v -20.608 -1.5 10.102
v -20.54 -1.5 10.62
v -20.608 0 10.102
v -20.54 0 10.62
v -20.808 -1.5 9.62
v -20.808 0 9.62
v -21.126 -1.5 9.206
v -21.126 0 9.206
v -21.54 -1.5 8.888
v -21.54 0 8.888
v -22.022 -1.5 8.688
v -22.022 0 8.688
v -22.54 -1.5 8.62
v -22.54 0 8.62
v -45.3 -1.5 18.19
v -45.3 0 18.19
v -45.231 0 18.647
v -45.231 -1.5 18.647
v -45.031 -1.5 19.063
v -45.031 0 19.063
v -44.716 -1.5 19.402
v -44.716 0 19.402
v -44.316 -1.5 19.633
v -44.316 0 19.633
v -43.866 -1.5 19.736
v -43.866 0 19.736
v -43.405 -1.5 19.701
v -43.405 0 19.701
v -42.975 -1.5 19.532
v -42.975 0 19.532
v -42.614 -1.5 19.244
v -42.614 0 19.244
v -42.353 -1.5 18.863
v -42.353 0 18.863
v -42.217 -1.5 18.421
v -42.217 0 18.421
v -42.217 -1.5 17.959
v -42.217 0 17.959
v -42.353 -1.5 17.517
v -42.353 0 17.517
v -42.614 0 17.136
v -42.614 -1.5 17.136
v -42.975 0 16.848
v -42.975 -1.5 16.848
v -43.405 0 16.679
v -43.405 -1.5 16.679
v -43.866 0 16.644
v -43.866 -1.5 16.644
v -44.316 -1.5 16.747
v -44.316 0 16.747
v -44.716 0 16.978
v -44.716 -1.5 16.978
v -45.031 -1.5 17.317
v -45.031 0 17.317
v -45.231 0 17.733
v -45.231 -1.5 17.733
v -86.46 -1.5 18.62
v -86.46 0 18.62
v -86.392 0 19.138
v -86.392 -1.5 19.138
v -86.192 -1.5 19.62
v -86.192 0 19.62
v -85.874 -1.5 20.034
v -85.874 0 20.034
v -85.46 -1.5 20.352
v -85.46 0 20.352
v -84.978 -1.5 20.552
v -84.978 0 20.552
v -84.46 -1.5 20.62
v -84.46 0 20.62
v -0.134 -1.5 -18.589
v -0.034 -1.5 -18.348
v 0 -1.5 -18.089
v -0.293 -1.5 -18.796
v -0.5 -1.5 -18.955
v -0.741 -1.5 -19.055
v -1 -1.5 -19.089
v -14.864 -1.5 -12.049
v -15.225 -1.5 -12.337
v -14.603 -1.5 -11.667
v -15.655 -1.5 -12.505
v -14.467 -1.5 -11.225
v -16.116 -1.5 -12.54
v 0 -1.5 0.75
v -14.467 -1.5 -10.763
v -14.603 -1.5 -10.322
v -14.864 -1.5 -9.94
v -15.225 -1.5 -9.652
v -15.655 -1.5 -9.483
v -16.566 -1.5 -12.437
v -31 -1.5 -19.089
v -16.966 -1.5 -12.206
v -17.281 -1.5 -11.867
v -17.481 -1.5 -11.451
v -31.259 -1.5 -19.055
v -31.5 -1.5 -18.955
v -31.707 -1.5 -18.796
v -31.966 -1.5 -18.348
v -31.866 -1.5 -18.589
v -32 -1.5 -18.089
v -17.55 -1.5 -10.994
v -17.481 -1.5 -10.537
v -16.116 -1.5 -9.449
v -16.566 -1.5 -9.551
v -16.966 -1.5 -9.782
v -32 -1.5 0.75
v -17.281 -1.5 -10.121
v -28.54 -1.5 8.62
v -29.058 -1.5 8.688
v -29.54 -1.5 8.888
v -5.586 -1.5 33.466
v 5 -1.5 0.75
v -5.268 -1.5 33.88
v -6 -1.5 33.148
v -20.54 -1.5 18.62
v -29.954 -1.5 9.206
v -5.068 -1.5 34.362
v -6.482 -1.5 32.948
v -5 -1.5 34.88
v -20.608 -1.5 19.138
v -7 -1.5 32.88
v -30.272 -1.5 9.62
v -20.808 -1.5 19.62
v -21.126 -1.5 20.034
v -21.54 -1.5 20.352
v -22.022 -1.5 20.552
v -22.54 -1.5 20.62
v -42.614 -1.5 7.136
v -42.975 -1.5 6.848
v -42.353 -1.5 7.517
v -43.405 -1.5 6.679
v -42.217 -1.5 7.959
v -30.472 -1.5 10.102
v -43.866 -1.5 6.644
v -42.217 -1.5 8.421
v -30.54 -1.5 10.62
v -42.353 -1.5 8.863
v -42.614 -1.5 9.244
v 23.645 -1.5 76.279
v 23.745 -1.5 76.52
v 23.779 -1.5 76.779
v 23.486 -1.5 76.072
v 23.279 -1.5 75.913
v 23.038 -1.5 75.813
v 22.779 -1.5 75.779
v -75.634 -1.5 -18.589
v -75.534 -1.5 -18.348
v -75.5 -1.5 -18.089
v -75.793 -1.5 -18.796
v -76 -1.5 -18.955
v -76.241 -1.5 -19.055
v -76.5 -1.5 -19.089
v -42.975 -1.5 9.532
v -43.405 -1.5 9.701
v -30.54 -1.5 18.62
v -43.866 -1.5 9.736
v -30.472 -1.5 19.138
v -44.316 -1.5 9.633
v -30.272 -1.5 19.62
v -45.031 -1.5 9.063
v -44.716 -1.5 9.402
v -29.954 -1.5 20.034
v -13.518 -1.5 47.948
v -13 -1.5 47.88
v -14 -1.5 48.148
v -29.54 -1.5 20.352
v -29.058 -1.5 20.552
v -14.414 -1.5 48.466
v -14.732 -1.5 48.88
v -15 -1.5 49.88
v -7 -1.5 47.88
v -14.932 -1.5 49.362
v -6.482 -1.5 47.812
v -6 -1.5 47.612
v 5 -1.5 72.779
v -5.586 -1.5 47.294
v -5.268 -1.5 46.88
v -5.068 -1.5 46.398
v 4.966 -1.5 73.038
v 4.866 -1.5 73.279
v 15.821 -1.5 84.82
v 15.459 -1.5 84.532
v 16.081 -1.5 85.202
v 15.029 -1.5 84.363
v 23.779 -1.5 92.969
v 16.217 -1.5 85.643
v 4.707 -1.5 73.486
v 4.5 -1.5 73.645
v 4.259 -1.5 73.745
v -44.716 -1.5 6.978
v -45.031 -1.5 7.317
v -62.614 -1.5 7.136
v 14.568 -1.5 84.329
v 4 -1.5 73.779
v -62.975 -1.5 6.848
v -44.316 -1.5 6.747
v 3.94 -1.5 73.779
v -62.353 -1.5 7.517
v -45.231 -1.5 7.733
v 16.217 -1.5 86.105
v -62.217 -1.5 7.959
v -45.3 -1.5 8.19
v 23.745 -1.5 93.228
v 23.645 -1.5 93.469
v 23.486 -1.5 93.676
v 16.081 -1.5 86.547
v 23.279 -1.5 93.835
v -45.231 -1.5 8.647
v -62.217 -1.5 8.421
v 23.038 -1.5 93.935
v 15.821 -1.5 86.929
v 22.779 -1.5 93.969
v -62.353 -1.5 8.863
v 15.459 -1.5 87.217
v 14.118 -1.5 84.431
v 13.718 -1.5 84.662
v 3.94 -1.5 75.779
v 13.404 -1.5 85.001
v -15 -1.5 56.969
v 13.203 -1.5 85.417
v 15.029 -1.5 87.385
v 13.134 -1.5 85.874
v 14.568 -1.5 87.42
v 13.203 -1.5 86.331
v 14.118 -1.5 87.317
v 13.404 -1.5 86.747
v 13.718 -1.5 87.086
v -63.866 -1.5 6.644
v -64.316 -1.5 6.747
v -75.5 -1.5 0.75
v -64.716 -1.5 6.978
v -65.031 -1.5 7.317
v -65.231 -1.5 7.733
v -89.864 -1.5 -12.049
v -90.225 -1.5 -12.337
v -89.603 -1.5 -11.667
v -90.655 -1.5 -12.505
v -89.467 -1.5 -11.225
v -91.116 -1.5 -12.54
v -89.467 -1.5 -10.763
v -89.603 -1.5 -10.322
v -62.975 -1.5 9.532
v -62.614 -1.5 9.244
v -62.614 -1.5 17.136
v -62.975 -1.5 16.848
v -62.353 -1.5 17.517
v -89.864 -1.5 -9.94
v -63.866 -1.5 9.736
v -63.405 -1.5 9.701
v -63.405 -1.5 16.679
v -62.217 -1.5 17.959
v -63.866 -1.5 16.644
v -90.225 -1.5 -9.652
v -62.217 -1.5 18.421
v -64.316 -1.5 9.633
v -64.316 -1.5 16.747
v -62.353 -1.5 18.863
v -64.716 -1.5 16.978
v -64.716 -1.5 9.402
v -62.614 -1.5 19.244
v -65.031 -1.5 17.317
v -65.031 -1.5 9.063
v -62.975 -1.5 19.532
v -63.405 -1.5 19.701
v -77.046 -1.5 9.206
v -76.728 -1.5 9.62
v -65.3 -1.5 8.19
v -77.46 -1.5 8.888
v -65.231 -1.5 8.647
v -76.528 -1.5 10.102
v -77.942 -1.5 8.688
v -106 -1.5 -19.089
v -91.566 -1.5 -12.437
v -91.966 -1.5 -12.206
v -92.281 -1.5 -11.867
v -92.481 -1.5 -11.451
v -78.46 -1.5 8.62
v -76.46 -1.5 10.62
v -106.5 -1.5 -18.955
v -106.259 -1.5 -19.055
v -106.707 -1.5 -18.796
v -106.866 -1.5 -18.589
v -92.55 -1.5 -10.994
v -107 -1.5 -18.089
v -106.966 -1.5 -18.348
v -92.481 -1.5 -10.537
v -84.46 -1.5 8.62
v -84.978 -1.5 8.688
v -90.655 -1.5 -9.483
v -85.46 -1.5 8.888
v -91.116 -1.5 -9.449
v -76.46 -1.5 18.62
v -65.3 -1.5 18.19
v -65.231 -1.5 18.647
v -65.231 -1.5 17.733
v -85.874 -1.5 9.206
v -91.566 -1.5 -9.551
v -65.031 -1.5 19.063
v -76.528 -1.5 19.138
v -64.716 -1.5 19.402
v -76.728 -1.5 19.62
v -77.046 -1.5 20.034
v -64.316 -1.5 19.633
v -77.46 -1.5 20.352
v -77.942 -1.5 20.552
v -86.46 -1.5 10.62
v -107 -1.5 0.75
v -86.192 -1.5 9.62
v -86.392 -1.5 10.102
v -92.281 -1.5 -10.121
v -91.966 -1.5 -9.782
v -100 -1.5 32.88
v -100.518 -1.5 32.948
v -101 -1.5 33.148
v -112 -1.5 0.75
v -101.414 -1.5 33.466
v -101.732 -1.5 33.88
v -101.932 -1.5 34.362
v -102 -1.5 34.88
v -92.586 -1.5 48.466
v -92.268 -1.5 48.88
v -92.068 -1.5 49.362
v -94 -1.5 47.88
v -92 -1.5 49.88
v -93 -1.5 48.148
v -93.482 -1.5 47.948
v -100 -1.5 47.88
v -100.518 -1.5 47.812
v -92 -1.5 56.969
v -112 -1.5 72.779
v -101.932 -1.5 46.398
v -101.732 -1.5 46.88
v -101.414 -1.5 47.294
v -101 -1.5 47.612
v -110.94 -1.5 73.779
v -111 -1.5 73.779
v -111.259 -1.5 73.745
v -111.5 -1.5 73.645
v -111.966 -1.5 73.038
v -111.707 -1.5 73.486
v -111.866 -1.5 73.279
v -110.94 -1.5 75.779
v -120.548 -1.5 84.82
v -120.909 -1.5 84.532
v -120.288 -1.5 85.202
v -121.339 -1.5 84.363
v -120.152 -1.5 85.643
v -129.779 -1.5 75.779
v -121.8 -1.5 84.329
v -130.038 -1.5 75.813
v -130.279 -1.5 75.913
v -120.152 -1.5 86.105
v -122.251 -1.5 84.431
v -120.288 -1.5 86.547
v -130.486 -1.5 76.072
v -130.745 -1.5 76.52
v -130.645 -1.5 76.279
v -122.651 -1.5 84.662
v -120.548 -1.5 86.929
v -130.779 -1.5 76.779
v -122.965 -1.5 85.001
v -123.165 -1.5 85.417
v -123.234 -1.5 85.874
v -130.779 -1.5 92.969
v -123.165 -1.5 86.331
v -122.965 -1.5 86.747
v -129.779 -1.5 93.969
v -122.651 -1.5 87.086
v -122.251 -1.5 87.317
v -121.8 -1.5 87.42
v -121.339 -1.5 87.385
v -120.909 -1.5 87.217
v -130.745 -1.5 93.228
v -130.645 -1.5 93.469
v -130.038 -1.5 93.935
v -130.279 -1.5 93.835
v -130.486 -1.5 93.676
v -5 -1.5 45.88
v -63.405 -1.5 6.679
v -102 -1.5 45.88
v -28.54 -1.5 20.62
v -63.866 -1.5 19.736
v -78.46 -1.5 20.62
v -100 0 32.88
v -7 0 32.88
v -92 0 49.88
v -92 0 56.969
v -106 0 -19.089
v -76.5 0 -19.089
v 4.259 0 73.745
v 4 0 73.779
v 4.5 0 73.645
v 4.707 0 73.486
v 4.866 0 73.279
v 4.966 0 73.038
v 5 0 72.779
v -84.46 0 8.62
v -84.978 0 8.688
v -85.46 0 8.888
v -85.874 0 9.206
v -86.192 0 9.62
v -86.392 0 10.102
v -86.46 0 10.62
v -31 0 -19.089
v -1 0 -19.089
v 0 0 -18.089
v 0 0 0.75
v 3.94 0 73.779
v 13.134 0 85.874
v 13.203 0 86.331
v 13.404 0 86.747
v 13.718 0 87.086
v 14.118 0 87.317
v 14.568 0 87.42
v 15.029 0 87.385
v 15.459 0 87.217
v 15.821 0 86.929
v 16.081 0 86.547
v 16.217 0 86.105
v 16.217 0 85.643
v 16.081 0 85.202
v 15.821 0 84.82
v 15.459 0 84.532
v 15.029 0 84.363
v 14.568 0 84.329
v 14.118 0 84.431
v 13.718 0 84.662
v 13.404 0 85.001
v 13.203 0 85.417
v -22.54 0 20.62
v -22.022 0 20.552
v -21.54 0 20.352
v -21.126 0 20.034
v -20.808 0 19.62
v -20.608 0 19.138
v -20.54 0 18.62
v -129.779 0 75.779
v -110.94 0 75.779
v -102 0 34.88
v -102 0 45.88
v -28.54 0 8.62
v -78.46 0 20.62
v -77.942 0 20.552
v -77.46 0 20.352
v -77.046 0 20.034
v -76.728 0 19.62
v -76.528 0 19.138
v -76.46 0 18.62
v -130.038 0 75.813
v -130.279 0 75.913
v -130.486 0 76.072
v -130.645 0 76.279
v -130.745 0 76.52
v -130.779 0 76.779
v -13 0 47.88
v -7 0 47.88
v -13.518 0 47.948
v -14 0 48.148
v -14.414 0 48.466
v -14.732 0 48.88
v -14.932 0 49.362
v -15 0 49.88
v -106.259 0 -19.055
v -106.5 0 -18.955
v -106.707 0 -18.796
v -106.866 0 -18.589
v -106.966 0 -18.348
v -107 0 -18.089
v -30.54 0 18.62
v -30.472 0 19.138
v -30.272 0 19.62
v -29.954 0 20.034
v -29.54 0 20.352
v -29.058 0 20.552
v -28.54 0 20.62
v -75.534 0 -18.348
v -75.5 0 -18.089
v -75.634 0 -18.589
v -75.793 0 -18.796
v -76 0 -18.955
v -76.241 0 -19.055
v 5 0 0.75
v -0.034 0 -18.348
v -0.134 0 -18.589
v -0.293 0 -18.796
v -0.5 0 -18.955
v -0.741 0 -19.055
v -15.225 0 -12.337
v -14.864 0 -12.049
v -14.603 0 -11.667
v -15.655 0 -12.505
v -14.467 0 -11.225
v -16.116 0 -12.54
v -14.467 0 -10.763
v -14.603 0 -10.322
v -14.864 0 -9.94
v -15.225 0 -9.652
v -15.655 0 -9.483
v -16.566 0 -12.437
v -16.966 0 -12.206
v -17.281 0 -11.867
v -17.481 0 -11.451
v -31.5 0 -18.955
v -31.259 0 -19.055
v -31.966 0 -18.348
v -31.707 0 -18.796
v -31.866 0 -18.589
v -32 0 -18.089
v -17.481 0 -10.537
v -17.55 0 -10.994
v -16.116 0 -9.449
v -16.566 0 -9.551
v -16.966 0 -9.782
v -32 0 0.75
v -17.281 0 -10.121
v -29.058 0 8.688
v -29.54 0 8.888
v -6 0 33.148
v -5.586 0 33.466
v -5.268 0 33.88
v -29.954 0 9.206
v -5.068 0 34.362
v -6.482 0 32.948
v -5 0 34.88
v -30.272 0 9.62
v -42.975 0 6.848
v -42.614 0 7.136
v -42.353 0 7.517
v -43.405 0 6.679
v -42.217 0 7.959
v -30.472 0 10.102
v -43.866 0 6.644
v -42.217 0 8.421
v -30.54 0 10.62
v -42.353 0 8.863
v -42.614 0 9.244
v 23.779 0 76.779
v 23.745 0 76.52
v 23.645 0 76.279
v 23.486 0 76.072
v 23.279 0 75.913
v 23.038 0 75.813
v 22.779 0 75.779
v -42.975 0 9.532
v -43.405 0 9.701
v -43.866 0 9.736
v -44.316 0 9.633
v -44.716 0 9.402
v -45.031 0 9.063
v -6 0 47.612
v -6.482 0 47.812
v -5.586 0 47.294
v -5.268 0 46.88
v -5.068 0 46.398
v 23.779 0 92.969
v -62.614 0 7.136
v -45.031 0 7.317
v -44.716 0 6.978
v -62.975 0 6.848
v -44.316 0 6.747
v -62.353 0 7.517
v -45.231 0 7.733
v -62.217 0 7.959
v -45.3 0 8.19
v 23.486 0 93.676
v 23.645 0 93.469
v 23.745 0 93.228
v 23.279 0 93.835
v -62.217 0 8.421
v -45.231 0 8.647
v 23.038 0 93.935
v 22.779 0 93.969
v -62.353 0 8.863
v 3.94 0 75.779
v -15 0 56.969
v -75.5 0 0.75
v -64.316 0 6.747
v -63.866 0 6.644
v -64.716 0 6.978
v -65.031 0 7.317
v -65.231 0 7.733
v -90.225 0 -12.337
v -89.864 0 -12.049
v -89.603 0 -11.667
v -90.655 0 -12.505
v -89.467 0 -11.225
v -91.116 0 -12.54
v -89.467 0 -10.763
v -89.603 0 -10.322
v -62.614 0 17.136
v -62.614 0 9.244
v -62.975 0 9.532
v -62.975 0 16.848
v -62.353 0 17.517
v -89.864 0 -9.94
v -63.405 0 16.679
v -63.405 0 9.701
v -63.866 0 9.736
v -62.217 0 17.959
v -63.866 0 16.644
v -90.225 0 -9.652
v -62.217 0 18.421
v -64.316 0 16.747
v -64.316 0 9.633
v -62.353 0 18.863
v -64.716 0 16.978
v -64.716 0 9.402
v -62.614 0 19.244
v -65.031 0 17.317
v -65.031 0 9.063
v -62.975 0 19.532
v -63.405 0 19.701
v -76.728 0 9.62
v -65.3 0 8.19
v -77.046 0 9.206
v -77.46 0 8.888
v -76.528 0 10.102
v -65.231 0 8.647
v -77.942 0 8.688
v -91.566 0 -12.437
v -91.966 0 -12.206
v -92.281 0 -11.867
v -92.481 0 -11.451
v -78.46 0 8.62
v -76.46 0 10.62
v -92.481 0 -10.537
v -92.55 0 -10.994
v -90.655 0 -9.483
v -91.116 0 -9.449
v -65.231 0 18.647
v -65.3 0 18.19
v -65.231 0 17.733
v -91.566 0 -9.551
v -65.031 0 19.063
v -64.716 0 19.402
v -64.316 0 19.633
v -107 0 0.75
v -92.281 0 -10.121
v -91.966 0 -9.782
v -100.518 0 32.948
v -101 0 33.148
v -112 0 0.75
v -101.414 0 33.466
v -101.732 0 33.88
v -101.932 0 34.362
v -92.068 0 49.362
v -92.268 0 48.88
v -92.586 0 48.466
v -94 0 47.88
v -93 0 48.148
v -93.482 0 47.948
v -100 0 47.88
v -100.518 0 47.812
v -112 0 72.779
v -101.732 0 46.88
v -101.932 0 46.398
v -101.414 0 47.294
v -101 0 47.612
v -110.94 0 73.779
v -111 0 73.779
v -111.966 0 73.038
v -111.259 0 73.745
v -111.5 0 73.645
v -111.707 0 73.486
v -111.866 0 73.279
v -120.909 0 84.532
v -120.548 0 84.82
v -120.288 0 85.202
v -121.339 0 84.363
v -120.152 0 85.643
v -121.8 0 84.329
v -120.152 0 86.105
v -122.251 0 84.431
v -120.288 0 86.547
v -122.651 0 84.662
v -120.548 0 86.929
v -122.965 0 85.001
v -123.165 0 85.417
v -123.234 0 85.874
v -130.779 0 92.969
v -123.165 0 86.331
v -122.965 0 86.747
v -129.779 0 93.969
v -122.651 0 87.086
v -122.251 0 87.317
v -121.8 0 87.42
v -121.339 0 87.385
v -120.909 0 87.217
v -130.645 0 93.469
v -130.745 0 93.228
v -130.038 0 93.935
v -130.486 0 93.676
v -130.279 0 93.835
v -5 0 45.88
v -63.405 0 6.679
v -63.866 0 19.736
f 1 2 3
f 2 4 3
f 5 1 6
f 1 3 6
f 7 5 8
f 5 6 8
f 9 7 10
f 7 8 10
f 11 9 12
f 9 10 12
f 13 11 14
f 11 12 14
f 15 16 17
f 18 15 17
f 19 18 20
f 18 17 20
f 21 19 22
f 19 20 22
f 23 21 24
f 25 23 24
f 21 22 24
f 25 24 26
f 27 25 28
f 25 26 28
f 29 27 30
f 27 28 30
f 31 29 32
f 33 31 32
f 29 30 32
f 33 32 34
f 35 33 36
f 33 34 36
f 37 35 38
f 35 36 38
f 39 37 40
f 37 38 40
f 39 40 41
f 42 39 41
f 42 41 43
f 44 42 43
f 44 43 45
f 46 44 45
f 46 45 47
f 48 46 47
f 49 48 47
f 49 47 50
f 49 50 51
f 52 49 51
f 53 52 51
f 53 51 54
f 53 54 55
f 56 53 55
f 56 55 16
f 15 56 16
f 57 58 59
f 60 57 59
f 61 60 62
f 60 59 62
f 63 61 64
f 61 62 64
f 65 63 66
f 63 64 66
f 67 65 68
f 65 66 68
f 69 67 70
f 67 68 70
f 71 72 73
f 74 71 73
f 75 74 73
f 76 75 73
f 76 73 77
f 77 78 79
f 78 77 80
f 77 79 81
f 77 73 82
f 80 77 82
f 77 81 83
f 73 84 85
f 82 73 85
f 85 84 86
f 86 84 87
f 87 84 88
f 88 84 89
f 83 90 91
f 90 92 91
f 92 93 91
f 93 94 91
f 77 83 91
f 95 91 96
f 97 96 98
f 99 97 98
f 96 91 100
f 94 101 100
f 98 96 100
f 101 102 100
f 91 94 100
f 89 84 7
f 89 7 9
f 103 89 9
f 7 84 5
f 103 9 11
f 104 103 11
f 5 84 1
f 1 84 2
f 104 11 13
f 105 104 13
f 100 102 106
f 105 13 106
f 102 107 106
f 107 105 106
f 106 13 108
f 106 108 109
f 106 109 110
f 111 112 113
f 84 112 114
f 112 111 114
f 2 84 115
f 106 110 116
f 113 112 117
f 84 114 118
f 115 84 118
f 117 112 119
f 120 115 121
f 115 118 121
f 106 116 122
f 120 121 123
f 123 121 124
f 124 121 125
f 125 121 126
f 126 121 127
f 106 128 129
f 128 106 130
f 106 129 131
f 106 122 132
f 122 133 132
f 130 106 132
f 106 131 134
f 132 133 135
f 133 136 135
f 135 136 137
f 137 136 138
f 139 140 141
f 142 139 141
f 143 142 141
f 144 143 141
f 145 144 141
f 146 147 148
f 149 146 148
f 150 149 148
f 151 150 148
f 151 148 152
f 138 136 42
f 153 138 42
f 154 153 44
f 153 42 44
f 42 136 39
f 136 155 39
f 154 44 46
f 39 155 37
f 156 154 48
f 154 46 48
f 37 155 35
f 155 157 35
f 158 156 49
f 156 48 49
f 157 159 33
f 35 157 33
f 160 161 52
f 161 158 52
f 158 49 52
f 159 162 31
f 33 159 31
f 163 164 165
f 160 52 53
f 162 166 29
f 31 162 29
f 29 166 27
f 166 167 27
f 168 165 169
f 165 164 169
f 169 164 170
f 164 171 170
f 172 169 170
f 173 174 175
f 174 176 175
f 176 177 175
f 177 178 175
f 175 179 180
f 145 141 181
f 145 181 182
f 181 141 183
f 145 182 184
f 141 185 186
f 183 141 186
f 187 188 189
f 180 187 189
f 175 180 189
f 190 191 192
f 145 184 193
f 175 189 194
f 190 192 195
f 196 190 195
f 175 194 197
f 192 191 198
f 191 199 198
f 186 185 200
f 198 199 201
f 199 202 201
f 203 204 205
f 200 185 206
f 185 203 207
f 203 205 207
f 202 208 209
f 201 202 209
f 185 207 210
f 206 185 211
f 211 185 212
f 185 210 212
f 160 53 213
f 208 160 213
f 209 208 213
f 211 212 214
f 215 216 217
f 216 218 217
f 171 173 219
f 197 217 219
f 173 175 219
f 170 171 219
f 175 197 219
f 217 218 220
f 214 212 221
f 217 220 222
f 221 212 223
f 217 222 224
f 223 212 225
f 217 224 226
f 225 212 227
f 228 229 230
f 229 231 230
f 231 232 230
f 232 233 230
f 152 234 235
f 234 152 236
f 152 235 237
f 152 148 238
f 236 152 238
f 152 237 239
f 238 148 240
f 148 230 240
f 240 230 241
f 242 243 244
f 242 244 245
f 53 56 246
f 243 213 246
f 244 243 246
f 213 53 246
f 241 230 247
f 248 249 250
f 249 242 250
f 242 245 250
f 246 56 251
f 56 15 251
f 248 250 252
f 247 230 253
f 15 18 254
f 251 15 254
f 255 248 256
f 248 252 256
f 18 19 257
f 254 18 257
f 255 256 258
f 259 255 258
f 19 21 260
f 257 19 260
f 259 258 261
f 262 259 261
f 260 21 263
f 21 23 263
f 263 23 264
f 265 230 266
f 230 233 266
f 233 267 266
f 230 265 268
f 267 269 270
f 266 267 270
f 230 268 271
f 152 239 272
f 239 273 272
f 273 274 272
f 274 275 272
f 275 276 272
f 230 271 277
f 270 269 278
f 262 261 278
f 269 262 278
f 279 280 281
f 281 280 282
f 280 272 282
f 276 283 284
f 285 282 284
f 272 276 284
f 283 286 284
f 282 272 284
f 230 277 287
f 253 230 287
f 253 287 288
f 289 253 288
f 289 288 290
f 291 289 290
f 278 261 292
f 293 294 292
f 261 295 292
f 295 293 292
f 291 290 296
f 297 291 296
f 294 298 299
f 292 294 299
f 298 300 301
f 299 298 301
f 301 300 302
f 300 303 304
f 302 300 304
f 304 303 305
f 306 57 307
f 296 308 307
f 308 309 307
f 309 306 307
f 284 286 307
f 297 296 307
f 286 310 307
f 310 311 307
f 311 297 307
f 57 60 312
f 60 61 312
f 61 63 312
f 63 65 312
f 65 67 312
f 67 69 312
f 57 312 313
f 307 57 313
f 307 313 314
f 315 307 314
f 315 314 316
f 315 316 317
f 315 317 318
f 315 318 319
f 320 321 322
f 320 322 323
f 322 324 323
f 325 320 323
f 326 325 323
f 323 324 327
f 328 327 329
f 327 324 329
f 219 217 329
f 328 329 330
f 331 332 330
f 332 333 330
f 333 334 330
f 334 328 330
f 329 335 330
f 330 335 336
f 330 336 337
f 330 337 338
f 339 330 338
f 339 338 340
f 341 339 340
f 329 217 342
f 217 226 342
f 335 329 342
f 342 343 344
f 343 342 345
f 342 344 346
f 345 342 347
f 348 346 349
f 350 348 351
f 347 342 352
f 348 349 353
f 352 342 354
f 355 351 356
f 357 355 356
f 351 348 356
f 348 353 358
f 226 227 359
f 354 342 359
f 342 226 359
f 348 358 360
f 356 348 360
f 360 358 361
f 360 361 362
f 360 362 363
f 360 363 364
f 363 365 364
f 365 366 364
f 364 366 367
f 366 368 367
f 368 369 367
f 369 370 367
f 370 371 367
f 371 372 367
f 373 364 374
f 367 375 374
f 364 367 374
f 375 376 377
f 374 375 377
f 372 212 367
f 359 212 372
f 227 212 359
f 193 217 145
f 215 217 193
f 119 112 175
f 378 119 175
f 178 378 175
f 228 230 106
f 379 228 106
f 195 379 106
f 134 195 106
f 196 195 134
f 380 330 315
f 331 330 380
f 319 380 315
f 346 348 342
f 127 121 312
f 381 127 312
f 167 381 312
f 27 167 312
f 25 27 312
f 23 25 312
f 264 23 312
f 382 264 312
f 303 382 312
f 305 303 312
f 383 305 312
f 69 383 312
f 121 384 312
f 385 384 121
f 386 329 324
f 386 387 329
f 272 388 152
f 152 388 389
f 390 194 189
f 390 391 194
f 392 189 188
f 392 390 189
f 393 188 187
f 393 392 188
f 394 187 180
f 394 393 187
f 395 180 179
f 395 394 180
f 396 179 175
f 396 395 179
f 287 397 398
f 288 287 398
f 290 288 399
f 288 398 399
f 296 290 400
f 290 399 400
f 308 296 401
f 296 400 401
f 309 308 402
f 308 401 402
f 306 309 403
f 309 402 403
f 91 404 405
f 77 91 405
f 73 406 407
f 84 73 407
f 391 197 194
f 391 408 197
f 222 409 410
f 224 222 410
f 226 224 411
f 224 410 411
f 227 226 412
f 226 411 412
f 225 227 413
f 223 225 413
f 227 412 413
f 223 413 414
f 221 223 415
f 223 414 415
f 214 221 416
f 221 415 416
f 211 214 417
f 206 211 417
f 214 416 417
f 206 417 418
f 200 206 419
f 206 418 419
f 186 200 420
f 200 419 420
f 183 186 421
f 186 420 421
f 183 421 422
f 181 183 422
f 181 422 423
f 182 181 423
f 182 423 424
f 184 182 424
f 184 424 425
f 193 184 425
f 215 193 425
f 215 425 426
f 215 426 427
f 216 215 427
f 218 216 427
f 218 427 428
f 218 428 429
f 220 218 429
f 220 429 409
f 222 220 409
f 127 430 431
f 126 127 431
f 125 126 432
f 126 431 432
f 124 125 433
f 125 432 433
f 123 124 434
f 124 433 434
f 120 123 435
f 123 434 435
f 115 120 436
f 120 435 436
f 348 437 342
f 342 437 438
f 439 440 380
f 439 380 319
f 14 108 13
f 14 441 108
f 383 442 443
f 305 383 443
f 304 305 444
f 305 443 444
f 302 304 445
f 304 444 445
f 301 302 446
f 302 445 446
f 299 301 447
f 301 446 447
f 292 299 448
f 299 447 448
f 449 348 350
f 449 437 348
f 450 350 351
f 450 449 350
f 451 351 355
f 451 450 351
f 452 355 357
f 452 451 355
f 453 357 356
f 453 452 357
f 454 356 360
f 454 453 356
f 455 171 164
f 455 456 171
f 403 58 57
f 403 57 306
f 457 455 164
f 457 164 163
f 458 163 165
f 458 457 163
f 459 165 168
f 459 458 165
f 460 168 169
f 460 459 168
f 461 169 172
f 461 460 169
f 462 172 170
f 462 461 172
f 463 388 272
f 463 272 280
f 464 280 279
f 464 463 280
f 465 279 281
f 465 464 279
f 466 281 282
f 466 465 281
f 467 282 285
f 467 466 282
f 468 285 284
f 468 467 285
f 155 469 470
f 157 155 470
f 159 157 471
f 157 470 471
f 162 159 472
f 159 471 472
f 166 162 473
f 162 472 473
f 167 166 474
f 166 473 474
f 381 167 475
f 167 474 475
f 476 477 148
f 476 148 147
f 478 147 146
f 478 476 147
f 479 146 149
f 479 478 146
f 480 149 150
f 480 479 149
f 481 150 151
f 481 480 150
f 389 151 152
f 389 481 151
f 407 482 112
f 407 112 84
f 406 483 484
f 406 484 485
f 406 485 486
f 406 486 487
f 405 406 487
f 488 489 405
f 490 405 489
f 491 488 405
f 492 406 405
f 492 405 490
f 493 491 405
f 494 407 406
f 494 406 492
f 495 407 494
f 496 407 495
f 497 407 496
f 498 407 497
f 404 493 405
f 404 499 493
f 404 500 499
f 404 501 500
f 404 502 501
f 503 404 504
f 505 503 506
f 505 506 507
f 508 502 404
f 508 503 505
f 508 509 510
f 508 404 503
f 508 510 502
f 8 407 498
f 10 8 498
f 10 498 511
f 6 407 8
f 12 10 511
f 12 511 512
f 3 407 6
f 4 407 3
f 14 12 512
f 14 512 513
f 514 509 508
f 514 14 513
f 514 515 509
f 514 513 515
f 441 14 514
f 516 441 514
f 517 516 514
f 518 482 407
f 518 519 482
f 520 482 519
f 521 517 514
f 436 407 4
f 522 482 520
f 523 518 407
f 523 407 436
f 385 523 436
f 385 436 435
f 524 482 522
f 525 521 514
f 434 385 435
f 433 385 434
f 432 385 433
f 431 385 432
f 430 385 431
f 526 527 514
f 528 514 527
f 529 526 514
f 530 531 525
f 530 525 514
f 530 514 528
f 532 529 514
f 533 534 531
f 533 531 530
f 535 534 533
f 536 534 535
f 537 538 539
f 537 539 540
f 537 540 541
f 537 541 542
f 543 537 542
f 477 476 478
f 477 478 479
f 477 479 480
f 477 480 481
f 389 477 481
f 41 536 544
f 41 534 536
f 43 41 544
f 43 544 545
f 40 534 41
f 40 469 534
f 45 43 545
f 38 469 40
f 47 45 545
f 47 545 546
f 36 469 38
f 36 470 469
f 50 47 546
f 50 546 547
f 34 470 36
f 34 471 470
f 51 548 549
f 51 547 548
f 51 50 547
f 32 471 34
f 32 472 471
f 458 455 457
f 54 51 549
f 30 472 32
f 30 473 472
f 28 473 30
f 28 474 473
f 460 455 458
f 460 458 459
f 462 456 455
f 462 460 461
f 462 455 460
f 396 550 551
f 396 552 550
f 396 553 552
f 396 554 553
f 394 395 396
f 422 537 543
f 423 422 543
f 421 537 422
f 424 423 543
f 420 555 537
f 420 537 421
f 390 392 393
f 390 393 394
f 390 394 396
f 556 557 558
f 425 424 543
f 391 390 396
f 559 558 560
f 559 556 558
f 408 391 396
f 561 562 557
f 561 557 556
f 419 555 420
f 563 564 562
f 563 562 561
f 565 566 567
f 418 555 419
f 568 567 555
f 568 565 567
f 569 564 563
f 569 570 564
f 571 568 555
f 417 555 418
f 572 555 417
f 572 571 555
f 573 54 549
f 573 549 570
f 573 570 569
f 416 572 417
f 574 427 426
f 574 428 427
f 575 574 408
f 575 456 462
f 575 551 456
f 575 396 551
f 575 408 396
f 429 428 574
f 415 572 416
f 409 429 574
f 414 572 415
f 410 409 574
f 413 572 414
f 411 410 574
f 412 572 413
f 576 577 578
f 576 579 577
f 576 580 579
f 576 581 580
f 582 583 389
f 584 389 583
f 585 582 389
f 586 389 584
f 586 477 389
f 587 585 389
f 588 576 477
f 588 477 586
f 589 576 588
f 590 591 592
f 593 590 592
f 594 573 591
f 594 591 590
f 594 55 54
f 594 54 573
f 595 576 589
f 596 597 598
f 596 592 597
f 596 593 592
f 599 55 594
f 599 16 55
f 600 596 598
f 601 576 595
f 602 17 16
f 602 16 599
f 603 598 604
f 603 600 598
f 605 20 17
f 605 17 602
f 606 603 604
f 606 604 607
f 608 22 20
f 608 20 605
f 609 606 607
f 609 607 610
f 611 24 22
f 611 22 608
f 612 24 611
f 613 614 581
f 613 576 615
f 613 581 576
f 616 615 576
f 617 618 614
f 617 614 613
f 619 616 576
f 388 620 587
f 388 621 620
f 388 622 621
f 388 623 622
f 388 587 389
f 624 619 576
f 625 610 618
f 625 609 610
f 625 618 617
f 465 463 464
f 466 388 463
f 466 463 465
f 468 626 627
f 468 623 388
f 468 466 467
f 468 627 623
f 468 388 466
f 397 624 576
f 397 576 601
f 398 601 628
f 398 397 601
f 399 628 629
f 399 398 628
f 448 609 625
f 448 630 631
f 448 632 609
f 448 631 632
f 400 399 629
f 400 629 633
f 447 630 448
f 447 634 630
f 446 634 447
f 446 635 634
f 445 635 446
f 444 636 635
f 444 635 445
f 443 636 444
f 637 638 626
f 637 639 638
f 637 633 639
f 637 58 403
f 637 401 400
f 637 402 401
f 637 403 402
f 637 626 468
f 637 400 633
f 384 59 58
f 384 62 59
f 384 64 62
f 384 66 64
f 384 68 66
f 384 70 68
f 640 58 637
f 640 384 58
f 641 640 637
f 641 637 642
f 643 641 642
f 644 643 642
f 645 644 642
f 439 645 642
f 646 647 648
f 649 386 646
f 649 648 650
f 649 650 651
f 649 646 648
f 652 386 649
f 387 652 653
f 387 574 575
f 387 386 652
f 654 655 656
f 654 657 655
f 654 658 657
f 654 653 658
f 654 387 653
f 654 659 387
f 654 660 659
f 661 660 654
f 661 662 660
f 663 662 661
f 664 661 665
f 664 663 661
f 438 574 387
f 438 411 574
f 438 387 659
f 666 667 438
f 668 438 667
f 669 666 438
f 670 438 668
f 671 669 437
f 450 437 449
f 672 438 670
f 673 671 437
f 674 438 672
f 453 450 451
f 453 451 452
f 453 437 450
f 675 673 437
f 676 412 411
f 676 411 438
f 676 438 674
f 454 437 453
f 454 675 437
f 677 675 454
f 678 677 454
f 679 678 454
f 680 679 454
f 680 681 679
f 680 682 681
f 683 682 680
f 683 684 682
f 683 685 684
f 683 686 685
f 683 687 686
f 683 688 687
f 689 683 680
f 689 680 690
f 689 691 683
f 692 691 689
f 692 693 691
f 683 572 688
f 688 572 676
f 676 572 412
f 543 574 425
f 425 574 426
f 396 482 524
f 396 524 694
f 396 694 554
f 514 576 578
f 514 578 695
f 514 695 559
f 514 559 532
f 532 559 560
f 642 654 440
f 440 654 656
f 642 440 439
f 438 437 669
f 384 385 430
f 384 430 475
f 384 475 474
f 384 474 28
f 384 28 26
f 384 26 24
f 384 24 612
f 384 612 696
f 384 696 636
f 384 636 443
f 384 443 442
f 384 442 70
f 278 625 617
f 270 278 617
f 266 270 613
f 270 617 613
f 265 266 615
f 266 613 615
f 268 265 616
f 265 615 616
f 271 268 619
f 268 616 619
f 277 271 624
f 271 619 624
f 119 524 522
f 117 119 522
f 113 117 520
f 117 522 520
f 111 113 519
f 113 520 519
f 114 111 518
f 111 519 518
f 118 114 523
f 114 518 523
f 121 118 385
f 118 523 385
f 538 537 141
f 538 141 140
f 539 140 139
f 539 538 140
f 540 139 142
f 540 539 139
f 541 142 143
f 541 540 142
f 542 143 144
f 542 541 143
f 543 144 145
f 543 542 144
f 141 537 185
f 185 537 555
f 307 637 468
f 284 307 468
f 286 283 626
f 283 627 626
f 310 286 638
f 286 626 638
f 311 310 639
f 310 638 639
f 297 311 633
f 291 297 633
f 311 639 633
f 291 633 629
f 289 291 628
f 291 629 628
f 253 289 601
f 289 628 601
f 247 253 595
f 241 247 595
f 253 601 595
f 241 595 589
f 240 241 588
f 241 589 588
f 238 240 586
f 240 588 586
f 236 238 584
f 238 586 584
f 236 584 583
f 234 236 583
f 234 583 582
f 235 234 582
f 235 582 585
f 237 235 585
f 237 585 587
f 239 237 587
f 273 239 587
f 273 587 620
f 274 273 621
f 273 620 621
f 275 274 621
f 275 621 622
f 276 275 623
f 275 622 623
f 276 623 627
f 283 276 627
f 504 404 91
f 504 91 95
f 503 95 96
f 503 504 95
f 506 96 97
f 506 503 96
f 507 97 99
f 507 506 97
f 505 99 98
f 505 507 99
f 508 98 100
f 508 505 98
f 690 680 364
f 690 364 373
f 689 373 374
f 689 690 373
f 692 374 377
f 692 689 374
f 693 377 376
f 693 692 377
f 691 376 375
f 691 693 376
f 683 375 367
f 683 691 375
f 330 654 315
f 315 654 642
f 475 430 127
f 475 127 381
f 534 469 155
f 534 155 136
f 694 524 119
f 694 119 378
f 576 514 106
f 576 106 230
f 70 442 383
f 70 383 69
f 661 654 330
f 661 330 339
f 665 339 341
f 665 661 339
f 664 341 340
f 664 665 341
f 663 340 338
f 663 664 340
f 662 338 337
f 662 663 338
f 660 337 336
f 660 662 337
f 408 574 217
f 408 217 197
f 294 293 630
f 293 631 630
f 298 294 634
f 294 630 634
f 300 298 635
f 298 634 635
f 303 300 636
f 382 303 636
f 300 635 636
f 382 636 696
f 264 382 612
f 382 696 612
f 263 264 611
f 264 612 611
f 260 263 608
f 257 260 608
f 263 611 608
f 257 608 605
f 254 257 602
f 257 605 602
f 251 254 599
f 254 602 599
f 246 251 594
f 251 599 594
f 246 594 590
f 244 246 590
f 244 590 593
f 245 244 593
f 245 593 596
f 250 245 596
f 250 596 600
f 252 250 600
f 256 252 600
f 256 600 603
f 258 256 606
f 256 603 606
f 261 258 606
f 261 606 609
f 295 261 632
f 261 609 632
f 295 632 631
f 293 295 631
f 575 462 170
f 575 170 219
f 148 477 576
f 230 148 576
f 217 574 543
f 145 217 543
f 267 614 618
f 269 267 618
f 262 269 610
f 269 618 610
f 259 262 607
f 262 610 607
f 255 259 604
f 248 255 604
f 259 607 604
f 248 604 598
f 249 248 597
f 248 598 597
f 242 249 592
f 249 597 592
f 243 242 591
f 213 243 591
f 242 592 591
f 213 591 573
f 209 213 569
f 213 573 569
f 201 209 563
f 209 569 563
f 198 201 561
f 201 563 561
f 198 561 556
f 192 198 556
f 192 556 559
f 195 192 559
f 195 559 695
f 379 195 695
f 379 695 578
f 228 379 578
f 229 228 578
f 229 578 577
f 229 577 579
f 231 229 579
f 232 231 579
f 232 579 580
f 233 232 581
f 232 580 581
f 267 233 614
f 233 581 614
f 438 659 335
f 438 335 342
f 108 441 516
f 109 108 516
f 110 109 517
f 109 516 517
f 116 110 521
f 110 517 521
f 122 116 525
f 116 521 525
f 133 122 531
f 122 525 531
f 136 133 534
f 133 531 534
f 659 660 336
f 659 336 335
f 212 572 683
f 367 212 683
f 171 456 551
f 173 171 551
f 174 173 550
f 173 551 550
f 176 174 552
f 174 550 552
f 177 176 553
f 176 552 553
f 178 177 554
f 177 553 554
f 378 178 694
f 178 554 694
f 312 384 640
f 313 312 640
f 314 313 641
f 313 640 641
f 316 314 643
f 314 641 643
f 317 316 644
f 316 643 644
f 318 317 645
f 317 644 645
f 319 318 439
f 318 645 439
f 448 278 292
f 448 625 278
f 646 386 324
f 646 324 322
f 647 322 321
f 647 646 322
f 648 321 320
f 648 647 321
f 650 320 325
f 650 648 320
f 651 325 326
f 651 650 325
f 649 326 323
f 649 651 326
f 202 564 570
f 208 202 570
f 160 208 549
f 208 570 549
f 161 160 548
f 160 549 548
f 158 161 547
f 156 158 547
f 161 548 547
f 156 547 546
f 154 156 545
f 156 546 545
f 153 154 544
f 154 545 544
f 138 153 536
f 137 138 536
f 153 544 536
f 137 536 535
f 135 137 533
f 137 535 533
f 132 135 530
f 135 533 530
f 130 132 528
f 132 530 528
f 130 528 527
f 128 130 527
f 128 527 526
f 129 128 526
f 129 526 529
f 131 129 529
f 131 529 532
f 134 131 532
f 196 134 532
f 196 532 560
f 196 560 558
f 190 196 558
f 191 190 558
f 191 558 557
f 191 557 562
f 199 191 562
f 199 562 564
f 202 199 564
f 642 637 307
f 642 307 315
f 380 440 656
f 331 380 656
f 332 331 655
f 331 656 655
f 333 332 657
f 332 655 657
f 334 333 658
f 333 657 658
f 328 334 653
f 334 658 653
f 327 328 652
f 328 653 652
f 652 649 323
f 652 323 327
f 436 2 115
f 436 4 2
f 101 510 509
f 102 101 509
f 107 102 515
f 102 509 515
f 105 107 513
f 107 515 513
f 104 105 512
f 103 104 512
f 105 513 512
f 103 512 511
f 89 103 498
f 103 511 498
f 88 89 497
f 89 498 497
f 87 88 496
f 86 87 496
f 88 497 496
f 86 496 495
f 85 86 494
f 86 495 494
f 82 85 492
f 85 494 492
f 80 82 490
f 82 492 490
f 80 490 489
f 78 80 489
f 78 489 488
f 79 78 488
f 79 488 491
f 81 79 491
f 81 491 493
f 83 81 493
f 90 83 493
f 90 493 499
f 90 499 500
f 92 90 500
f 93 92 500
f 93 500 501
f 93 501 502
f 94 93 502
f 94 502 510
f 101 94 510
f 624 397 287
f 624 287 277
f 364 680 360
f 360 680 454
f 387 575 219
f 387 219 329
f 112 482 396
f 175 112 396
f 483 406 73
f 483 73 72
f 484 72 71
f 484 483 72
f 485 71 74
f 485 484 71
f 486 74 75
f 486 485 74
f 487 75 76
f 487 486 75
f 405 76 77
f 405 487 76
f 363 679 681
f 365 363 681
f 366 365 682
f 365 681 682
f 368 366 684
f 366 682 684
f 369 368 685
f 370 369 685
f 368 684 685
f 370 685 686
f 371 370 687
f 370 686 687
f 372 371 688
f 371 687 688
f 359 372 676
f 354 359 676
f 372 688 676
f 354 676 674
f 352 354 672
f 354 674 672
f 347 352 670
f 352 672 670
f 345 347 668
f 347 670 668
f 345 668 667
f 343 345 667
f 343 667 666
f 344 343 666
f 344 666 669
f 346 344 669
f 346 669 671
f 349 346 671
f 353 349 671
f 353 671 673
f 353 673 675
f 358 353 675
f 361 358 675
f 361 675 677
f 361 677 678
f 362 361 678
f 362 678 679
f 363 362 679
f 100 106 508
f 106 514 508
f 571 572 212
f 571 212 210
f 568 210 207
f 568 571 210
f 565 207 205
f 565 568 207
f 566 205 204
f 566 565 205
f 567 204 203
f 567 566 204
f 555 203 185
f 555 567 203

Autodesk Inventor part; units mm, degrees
ref_plane "YZ Plane" through (0, 0, 0) normal (1, 0, 0) x (0, 1, 0)
ref_plane "XZ Plane" through (0, 0, 0) normal (0, 1, 0) x (-1, 0, 0)
ref_plane "XY Plane" through (0, 0, 0) normal (0, 0, 1) x (1, 0, 0)
sketch "Sketch1" plane through (0, 0, 0) normal (0, 1, 0) x (-1, 0, 0)
  line L0 (-5, 55.3296) -> (112, 55.3296)
  line L1 (75.5, -0.4496) -> (107, -0.4496)
  line L2 (-5.1396, 93.9693) -> (-5.1396, 75.7793)
  line L3 (112.1396, 75.7793) -> (112.1396, 93.9693)
  line L4 (0, -0.4496) -> (32, -0.4496)
  arc A0 (30.54, 18.62) -> (28.54, 20.62) centre (28.54, 18.62) ccw
  line L5 (22.54, 20.62) -> (28.54, 20.62)
  arc A1 (28.54, 8.62) -> (30.54, 10.62) centre (28.54, 10.62) ccw
  line L6 (30.54, 18.62) -> (30.54, 10.62)
  arc A2 (22.54, 20.62) -> (20.54, 18.62) centre (22.54, 18.62) ccw
  line L7 (20.54, 10.62) -> (20.54, 18.62)
  arc A3 (20.54, 10.62) -> (22.54, 8.62) centre (22.54, 10.62) ccw
  line L8 (28.54, 8.62) -> (22.54, 8.62)
  arc A4 (78.46, 20.62) -> (76.46, 18.62) centre (78.46, 18.62) ccw
  line L9 (76.46, 10.62) -> (76.46, 18.62)
  arc A5 (86.46, 18.62) -> (84.46, 20.62) centre (84.46, 18.62) ccw
  line L10 (78.46, 20.62) -> (84.46, 20.62)
  arc A6 (76.46, 10.62) -> (78.46, 8.62) centre (78.46, 10.62) ccw
  line L11 (84.46, 8.62) -> (78.46, 8.62)
  arc A7 (84.46, 8.62) -> (86.46, 10.62) centre (84.46, 10.62) ccw
  line L12 (86.46, 18.62) -> (86.46, 10.62)
  arc A8 (7, 47.88) -> (5, 45.88) centre (7, 45.88) ccw
  line L13 (5, 34.88) -> (5, 45.88)
  arc A9 (13, 47.88) -> (15, 49.88) centre (13, 49.88) ccw
  line L14 (15, 49.88) -> (15, 56.9693)
  arc A10 (5, 34.88) -> (7, 32.88) centre (7, 34.88) ccw
  line L15 (100, 32.88) -> (7, 32.88)
  arc A11 (92, 49.88) -> (94, 47.88) centre (94, 49.88) ccw
  line L16 (92, 56.9693) -> (92, 49.88)
  arc A12 (102, 45.88) -> (100, 47.88) centre (100, 45.88) ccw
  line L17 (94, 47.88) -> (100, 47.88)
  arc A13 (100, 32.88) -> (102, 34.88) centre (100, 34.88) ccw
  line L18 (102, 45.88) -> (102, 34.88)
  line L19 (15, 56.9693) -> (92, 56.9693)
  line L20 (7, 47.88) -> (13, 47.88)
  circle A14 centre (91, -10.9943) radius 1.55
  circle A15 centre (16, -10.9943) radius 1.55
  circle A16 centre (121.6843, 85.8743) radius 1.55
  circle A17 centre (-14.6843, 85.8743) radius 1.55
  circle A18 centre (63.75, 8.19) radius 1.55
  circle A19 centre (63.75, 18.19) radius 1.55
  circle A20 centre (43.75, 8.19) radius 1.55
  circle A21 centre (43.75, 18.19) radius 1.55
  arc A22 (112, 72.7793) -> (111, 73.7793) centre (111, 72.7793) ccw
  arc A23 (-4, 73.7793) -> (-5, 72.7793) centre (-4, 72.7793) ccw
  line L21 (-3.94, 73.7793) -> (-4, 73.7793)
  arc A24 (-23.7793, 76.7793) -> (-22.7793, 75.7793) centre (-22.7793, 76.7793) ccw
  arc A25 (-22.7793, 93.9693) -> (-23.7793, 92.9693) centre (-22.7793, 92.9693) ccw
  line L22 (-22.7793, 93.9693) -> (129.7793, 93.9693)
  arc A26 (130.7793, 92.9693) -> (129.7793, 93.9693) centre (129.7793, 92.9693) ccw
  arc A27 (129.7793, 75.7793) -> (130.7793, 76.7793) centre (129.7793, 76.7793) ccw
  line L23 (129.7793, 75.7793) -> (110.94, 75.7793)
  arc A28 (31, -19.0893) -> (32, -18.0893) centre (31, -18.0893) ccw
  arc A29 (0, -18.0893) -> (1, -19.0893) centre (1, -18.0893) ccw
  arc A30 (106, -19.0893) -> (107, -18.0893) centre (106, -18.0893) ccw
  arc A31 (75.5, -18.0893) -> (76.5, -19.0893) centre (76.5, -18.0893) ccw
  line L24 (75.5, -18.0893) -> (75.5, 0.75)
  line L25 (106, -19.0893) -> (76.5, -19.0893)
  line L26 (107, 0.75) -> (107, -18.0893)
  line L27 (107, 0.75) -> (112, 0.75)
  line L28 (112, 72.7793) -> (112, 0.75)
  line L29 (31, -19.0893) -> (1, -19.0893)
  line L30 (0, -18.0893) -> (0, 0.75)
  line L31 (-5, 0.75) -> (0, 0.75)
  line L32 (32, 0.75) -> (32, -18.0893)
  line L33 (32, 0.75) -> (75.5, 0.75)
  line L34 (-5, 0.75) -> (-5, 72.7793)
  line L35 (130.7793, 92.9693) -> (130.7793, 76.7793)
  line L36 (-23.7793, 76.7793) -> (-23.7793, 92.9693)
  line L37 (-3.94, 75.7793) -> (-22.7793, 75.7793)
  line L38 (-3.94, 75.7793) -> (-3.94, 73.7793)
  line L39 (111, 73.7793) -> (110.94, 73.7793)
  line L40 (110.94, 73.7793) -> (110.94, 75.7793)
  line L41 (112.5893, 93.9693) -> (112.5893, 75.7793)
  line L42 (-5.5893, 75.7793) -> (-5.5893, 93.9693)
  line L43 (111.69, 75.7793) -> (111.69, 93.9693)
  line L44 (-4.69, 93.9693) -> (-4.69, 75.7793)
  line L45 (32, -0.8993) -> (0, -0.8993)
  line L46 (107, -0.8993) -> (75.5, -0.8993)
  line L47 (-5, 55.7793) -> (15, 55.7793)
  line L48 (92, 55.7793) -> (112, 55.7793)
  line L49 (0, 0) -> (32, 0)
  line L50 (75.5, 0) -> (107, 0)
  line L51 (15, 54.88) -> (-5, 54.88)
  line L52 (112, 54.88) -> (92, 54.88)
extrude "Extrusion1" add sketch "Sketch1" against normal blind 1.5 contours L34 L47 L14 L0 | L0 L14 L51 L34 | L51 L14 A9 L20 A8 L13 A10 L15 A13 L18 A12 L17 A11 L16 L52 L28 L27 L26 L50 L24 L33 L32 L49 L30 L31 L34 | L34 A23 L21 L38 L37 L44 L22 L43 L23 L40 L39 A22 L28 L48 L16 L19 L14 L47 | L16 L48 L28 L0 | L0 L28 L52 L16 | L49 L32 L4 L30 | L4 L32 L45 L30 | L45 L32 A28 L29 A29 L30 | L37 L2 L22 L44 | L26 L1 L24 L50 | L37 L42 L22 L2 | L26 L46 L24 L1 | L37 A24 L36 A25 L22 L42 | L22 L3 L23 L43 | L26 A30 L25 A31 L24 L46 | L22 L41 L23 L3 | L22 A26 L35 A27 L23 L41
properties part number "body_top_frame"
